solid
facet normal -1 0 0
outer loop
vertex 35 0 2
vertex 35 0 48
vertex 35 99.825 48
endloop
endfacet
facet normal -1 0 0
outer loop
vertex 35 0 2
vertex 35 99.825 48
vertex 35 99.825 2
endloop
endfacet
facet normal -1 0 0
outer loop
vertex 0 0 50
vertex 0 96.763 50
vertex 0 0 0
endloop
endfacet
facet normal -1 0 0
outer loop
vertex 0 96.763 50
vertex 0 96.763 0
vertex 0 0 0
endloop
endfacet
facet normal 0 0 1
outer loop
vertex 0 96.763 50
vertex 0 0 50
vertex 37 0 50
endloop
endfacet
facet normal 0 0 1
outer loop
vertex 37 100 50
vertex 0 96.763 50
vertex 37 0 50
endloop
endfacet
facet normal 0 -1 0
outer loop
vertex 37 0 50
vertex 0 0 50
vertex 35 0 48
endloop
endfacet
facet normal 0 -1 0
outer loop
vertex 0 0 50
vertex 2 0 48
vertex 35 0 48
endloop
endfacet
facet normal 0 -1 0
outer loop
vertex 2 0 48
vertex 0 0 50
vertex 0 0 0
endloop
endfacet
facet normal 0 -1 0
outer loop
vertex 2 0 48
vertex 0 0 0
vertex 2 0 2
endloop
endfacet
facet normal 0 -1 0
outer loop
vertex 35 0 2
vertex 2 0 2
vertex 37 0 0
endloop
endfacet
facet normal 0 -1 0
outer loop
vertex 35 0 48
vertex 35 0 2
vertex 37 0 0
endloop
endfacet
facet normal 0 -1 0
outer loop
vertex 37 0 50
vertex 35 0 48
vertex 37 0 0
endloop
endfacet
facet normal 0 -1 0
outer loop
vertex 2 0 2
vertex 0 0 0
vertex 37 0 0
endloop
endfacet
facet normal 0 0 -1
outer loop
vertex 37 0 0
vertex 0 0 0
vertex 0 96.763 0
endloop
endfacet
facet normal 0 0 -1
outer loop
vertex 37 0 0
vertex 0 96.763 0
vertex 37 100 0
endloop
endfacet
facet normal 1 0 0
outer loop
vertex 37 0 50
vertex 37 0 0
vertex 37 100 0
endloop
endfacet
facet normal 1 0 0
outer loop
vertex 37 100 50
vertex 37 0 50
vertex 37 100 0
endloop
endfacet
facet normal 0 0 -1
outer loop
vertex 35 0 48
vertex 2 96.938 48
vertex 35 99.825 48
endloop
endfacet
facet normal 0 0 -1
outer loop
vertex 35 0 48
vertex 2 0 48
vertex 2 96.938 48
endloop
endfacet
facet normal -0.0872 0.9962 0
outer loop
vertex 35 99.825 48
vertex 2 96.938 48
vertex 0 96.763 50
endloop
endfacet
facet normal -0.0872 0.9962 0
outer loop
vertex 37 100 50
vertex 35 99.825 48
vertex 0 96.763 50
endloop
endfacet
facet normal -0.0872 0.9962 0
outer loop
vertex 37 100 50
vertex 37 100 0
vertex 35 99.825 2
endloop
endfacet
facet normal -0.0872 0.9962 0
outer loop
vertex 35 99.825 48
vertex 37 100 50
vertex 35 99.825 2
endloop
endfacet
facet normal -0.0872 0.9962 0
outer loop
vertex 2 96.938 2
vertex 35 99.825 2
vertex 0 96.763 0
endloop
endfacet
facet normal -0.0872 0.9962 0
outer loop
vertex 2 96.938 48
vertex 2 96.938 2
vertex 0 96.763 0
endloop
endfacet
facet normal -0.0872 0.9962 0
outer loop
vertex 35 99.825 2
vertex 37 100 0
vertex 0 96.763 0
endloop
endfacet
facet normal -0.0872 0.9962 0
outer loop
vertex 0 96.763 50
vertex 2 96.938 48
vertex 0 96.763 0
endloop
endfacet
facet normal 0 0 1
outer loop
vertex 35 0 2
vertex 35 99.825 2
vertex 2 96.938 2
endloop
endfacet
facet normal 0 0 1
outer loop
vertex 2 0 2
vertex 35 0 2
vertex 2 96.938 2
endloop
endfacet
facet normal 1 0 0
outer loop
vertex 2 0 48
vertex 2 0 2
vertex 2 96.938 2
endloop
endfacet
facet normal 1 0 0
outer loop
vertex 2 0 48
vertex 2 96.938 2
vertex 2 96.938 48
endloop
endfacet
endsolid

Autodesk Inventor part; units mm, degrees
ref_plane "YZ Plane" through (0, 0, 0) normal (1, 0, 0) x (0, 1, 0)
ref_plane "XZ Plane" through (0, 0, 0) normal (0, 1, 0) x (-1, 0, 0)
ref_plane "XY Plane" through (0, 0, 0) normal (0, 0, 1) x (1, 0, 0)
sketch "Sketch1" plane through (0, 0, 0) normal (0, 0, 1) x (1, 0, 0)
  line L0 (0, 0) -> (37, 0)
  line L1 (37, 0) -> (37, 100)
  line L2 (0, 96.7629) -> (0, 0)
  line L3 (37, 100) -> (0, 96.7629)
  line L4 (37, 100) -> (74.1413, 100) construction
  dimension "d0" = 37
  dimension "d1" = 100
  dimension "d2" = 175
extrude "Extrusion1" add sketch "Sketch1" along normal blind 50
sketch "Sketch2" plane through (0, 0, 0) normal (0, -1, 0) x (1, 0, 0)
  line L0 (35, 48) -> (35, 2)
  line L1 (37, 0) -> (0, 0) projected
  line L2 (35, 2) -> (2, 2)
  line L3 (2, 2) -> (2, 48)
  line L4 (2, 48) -> (35, 48)
  dimension "d5" = 46
  dimension "d6" = 33
extrude "Extrusion2" cut sketch "Sketch2" against normal blind 100
properties part number "Housing of the motor"
